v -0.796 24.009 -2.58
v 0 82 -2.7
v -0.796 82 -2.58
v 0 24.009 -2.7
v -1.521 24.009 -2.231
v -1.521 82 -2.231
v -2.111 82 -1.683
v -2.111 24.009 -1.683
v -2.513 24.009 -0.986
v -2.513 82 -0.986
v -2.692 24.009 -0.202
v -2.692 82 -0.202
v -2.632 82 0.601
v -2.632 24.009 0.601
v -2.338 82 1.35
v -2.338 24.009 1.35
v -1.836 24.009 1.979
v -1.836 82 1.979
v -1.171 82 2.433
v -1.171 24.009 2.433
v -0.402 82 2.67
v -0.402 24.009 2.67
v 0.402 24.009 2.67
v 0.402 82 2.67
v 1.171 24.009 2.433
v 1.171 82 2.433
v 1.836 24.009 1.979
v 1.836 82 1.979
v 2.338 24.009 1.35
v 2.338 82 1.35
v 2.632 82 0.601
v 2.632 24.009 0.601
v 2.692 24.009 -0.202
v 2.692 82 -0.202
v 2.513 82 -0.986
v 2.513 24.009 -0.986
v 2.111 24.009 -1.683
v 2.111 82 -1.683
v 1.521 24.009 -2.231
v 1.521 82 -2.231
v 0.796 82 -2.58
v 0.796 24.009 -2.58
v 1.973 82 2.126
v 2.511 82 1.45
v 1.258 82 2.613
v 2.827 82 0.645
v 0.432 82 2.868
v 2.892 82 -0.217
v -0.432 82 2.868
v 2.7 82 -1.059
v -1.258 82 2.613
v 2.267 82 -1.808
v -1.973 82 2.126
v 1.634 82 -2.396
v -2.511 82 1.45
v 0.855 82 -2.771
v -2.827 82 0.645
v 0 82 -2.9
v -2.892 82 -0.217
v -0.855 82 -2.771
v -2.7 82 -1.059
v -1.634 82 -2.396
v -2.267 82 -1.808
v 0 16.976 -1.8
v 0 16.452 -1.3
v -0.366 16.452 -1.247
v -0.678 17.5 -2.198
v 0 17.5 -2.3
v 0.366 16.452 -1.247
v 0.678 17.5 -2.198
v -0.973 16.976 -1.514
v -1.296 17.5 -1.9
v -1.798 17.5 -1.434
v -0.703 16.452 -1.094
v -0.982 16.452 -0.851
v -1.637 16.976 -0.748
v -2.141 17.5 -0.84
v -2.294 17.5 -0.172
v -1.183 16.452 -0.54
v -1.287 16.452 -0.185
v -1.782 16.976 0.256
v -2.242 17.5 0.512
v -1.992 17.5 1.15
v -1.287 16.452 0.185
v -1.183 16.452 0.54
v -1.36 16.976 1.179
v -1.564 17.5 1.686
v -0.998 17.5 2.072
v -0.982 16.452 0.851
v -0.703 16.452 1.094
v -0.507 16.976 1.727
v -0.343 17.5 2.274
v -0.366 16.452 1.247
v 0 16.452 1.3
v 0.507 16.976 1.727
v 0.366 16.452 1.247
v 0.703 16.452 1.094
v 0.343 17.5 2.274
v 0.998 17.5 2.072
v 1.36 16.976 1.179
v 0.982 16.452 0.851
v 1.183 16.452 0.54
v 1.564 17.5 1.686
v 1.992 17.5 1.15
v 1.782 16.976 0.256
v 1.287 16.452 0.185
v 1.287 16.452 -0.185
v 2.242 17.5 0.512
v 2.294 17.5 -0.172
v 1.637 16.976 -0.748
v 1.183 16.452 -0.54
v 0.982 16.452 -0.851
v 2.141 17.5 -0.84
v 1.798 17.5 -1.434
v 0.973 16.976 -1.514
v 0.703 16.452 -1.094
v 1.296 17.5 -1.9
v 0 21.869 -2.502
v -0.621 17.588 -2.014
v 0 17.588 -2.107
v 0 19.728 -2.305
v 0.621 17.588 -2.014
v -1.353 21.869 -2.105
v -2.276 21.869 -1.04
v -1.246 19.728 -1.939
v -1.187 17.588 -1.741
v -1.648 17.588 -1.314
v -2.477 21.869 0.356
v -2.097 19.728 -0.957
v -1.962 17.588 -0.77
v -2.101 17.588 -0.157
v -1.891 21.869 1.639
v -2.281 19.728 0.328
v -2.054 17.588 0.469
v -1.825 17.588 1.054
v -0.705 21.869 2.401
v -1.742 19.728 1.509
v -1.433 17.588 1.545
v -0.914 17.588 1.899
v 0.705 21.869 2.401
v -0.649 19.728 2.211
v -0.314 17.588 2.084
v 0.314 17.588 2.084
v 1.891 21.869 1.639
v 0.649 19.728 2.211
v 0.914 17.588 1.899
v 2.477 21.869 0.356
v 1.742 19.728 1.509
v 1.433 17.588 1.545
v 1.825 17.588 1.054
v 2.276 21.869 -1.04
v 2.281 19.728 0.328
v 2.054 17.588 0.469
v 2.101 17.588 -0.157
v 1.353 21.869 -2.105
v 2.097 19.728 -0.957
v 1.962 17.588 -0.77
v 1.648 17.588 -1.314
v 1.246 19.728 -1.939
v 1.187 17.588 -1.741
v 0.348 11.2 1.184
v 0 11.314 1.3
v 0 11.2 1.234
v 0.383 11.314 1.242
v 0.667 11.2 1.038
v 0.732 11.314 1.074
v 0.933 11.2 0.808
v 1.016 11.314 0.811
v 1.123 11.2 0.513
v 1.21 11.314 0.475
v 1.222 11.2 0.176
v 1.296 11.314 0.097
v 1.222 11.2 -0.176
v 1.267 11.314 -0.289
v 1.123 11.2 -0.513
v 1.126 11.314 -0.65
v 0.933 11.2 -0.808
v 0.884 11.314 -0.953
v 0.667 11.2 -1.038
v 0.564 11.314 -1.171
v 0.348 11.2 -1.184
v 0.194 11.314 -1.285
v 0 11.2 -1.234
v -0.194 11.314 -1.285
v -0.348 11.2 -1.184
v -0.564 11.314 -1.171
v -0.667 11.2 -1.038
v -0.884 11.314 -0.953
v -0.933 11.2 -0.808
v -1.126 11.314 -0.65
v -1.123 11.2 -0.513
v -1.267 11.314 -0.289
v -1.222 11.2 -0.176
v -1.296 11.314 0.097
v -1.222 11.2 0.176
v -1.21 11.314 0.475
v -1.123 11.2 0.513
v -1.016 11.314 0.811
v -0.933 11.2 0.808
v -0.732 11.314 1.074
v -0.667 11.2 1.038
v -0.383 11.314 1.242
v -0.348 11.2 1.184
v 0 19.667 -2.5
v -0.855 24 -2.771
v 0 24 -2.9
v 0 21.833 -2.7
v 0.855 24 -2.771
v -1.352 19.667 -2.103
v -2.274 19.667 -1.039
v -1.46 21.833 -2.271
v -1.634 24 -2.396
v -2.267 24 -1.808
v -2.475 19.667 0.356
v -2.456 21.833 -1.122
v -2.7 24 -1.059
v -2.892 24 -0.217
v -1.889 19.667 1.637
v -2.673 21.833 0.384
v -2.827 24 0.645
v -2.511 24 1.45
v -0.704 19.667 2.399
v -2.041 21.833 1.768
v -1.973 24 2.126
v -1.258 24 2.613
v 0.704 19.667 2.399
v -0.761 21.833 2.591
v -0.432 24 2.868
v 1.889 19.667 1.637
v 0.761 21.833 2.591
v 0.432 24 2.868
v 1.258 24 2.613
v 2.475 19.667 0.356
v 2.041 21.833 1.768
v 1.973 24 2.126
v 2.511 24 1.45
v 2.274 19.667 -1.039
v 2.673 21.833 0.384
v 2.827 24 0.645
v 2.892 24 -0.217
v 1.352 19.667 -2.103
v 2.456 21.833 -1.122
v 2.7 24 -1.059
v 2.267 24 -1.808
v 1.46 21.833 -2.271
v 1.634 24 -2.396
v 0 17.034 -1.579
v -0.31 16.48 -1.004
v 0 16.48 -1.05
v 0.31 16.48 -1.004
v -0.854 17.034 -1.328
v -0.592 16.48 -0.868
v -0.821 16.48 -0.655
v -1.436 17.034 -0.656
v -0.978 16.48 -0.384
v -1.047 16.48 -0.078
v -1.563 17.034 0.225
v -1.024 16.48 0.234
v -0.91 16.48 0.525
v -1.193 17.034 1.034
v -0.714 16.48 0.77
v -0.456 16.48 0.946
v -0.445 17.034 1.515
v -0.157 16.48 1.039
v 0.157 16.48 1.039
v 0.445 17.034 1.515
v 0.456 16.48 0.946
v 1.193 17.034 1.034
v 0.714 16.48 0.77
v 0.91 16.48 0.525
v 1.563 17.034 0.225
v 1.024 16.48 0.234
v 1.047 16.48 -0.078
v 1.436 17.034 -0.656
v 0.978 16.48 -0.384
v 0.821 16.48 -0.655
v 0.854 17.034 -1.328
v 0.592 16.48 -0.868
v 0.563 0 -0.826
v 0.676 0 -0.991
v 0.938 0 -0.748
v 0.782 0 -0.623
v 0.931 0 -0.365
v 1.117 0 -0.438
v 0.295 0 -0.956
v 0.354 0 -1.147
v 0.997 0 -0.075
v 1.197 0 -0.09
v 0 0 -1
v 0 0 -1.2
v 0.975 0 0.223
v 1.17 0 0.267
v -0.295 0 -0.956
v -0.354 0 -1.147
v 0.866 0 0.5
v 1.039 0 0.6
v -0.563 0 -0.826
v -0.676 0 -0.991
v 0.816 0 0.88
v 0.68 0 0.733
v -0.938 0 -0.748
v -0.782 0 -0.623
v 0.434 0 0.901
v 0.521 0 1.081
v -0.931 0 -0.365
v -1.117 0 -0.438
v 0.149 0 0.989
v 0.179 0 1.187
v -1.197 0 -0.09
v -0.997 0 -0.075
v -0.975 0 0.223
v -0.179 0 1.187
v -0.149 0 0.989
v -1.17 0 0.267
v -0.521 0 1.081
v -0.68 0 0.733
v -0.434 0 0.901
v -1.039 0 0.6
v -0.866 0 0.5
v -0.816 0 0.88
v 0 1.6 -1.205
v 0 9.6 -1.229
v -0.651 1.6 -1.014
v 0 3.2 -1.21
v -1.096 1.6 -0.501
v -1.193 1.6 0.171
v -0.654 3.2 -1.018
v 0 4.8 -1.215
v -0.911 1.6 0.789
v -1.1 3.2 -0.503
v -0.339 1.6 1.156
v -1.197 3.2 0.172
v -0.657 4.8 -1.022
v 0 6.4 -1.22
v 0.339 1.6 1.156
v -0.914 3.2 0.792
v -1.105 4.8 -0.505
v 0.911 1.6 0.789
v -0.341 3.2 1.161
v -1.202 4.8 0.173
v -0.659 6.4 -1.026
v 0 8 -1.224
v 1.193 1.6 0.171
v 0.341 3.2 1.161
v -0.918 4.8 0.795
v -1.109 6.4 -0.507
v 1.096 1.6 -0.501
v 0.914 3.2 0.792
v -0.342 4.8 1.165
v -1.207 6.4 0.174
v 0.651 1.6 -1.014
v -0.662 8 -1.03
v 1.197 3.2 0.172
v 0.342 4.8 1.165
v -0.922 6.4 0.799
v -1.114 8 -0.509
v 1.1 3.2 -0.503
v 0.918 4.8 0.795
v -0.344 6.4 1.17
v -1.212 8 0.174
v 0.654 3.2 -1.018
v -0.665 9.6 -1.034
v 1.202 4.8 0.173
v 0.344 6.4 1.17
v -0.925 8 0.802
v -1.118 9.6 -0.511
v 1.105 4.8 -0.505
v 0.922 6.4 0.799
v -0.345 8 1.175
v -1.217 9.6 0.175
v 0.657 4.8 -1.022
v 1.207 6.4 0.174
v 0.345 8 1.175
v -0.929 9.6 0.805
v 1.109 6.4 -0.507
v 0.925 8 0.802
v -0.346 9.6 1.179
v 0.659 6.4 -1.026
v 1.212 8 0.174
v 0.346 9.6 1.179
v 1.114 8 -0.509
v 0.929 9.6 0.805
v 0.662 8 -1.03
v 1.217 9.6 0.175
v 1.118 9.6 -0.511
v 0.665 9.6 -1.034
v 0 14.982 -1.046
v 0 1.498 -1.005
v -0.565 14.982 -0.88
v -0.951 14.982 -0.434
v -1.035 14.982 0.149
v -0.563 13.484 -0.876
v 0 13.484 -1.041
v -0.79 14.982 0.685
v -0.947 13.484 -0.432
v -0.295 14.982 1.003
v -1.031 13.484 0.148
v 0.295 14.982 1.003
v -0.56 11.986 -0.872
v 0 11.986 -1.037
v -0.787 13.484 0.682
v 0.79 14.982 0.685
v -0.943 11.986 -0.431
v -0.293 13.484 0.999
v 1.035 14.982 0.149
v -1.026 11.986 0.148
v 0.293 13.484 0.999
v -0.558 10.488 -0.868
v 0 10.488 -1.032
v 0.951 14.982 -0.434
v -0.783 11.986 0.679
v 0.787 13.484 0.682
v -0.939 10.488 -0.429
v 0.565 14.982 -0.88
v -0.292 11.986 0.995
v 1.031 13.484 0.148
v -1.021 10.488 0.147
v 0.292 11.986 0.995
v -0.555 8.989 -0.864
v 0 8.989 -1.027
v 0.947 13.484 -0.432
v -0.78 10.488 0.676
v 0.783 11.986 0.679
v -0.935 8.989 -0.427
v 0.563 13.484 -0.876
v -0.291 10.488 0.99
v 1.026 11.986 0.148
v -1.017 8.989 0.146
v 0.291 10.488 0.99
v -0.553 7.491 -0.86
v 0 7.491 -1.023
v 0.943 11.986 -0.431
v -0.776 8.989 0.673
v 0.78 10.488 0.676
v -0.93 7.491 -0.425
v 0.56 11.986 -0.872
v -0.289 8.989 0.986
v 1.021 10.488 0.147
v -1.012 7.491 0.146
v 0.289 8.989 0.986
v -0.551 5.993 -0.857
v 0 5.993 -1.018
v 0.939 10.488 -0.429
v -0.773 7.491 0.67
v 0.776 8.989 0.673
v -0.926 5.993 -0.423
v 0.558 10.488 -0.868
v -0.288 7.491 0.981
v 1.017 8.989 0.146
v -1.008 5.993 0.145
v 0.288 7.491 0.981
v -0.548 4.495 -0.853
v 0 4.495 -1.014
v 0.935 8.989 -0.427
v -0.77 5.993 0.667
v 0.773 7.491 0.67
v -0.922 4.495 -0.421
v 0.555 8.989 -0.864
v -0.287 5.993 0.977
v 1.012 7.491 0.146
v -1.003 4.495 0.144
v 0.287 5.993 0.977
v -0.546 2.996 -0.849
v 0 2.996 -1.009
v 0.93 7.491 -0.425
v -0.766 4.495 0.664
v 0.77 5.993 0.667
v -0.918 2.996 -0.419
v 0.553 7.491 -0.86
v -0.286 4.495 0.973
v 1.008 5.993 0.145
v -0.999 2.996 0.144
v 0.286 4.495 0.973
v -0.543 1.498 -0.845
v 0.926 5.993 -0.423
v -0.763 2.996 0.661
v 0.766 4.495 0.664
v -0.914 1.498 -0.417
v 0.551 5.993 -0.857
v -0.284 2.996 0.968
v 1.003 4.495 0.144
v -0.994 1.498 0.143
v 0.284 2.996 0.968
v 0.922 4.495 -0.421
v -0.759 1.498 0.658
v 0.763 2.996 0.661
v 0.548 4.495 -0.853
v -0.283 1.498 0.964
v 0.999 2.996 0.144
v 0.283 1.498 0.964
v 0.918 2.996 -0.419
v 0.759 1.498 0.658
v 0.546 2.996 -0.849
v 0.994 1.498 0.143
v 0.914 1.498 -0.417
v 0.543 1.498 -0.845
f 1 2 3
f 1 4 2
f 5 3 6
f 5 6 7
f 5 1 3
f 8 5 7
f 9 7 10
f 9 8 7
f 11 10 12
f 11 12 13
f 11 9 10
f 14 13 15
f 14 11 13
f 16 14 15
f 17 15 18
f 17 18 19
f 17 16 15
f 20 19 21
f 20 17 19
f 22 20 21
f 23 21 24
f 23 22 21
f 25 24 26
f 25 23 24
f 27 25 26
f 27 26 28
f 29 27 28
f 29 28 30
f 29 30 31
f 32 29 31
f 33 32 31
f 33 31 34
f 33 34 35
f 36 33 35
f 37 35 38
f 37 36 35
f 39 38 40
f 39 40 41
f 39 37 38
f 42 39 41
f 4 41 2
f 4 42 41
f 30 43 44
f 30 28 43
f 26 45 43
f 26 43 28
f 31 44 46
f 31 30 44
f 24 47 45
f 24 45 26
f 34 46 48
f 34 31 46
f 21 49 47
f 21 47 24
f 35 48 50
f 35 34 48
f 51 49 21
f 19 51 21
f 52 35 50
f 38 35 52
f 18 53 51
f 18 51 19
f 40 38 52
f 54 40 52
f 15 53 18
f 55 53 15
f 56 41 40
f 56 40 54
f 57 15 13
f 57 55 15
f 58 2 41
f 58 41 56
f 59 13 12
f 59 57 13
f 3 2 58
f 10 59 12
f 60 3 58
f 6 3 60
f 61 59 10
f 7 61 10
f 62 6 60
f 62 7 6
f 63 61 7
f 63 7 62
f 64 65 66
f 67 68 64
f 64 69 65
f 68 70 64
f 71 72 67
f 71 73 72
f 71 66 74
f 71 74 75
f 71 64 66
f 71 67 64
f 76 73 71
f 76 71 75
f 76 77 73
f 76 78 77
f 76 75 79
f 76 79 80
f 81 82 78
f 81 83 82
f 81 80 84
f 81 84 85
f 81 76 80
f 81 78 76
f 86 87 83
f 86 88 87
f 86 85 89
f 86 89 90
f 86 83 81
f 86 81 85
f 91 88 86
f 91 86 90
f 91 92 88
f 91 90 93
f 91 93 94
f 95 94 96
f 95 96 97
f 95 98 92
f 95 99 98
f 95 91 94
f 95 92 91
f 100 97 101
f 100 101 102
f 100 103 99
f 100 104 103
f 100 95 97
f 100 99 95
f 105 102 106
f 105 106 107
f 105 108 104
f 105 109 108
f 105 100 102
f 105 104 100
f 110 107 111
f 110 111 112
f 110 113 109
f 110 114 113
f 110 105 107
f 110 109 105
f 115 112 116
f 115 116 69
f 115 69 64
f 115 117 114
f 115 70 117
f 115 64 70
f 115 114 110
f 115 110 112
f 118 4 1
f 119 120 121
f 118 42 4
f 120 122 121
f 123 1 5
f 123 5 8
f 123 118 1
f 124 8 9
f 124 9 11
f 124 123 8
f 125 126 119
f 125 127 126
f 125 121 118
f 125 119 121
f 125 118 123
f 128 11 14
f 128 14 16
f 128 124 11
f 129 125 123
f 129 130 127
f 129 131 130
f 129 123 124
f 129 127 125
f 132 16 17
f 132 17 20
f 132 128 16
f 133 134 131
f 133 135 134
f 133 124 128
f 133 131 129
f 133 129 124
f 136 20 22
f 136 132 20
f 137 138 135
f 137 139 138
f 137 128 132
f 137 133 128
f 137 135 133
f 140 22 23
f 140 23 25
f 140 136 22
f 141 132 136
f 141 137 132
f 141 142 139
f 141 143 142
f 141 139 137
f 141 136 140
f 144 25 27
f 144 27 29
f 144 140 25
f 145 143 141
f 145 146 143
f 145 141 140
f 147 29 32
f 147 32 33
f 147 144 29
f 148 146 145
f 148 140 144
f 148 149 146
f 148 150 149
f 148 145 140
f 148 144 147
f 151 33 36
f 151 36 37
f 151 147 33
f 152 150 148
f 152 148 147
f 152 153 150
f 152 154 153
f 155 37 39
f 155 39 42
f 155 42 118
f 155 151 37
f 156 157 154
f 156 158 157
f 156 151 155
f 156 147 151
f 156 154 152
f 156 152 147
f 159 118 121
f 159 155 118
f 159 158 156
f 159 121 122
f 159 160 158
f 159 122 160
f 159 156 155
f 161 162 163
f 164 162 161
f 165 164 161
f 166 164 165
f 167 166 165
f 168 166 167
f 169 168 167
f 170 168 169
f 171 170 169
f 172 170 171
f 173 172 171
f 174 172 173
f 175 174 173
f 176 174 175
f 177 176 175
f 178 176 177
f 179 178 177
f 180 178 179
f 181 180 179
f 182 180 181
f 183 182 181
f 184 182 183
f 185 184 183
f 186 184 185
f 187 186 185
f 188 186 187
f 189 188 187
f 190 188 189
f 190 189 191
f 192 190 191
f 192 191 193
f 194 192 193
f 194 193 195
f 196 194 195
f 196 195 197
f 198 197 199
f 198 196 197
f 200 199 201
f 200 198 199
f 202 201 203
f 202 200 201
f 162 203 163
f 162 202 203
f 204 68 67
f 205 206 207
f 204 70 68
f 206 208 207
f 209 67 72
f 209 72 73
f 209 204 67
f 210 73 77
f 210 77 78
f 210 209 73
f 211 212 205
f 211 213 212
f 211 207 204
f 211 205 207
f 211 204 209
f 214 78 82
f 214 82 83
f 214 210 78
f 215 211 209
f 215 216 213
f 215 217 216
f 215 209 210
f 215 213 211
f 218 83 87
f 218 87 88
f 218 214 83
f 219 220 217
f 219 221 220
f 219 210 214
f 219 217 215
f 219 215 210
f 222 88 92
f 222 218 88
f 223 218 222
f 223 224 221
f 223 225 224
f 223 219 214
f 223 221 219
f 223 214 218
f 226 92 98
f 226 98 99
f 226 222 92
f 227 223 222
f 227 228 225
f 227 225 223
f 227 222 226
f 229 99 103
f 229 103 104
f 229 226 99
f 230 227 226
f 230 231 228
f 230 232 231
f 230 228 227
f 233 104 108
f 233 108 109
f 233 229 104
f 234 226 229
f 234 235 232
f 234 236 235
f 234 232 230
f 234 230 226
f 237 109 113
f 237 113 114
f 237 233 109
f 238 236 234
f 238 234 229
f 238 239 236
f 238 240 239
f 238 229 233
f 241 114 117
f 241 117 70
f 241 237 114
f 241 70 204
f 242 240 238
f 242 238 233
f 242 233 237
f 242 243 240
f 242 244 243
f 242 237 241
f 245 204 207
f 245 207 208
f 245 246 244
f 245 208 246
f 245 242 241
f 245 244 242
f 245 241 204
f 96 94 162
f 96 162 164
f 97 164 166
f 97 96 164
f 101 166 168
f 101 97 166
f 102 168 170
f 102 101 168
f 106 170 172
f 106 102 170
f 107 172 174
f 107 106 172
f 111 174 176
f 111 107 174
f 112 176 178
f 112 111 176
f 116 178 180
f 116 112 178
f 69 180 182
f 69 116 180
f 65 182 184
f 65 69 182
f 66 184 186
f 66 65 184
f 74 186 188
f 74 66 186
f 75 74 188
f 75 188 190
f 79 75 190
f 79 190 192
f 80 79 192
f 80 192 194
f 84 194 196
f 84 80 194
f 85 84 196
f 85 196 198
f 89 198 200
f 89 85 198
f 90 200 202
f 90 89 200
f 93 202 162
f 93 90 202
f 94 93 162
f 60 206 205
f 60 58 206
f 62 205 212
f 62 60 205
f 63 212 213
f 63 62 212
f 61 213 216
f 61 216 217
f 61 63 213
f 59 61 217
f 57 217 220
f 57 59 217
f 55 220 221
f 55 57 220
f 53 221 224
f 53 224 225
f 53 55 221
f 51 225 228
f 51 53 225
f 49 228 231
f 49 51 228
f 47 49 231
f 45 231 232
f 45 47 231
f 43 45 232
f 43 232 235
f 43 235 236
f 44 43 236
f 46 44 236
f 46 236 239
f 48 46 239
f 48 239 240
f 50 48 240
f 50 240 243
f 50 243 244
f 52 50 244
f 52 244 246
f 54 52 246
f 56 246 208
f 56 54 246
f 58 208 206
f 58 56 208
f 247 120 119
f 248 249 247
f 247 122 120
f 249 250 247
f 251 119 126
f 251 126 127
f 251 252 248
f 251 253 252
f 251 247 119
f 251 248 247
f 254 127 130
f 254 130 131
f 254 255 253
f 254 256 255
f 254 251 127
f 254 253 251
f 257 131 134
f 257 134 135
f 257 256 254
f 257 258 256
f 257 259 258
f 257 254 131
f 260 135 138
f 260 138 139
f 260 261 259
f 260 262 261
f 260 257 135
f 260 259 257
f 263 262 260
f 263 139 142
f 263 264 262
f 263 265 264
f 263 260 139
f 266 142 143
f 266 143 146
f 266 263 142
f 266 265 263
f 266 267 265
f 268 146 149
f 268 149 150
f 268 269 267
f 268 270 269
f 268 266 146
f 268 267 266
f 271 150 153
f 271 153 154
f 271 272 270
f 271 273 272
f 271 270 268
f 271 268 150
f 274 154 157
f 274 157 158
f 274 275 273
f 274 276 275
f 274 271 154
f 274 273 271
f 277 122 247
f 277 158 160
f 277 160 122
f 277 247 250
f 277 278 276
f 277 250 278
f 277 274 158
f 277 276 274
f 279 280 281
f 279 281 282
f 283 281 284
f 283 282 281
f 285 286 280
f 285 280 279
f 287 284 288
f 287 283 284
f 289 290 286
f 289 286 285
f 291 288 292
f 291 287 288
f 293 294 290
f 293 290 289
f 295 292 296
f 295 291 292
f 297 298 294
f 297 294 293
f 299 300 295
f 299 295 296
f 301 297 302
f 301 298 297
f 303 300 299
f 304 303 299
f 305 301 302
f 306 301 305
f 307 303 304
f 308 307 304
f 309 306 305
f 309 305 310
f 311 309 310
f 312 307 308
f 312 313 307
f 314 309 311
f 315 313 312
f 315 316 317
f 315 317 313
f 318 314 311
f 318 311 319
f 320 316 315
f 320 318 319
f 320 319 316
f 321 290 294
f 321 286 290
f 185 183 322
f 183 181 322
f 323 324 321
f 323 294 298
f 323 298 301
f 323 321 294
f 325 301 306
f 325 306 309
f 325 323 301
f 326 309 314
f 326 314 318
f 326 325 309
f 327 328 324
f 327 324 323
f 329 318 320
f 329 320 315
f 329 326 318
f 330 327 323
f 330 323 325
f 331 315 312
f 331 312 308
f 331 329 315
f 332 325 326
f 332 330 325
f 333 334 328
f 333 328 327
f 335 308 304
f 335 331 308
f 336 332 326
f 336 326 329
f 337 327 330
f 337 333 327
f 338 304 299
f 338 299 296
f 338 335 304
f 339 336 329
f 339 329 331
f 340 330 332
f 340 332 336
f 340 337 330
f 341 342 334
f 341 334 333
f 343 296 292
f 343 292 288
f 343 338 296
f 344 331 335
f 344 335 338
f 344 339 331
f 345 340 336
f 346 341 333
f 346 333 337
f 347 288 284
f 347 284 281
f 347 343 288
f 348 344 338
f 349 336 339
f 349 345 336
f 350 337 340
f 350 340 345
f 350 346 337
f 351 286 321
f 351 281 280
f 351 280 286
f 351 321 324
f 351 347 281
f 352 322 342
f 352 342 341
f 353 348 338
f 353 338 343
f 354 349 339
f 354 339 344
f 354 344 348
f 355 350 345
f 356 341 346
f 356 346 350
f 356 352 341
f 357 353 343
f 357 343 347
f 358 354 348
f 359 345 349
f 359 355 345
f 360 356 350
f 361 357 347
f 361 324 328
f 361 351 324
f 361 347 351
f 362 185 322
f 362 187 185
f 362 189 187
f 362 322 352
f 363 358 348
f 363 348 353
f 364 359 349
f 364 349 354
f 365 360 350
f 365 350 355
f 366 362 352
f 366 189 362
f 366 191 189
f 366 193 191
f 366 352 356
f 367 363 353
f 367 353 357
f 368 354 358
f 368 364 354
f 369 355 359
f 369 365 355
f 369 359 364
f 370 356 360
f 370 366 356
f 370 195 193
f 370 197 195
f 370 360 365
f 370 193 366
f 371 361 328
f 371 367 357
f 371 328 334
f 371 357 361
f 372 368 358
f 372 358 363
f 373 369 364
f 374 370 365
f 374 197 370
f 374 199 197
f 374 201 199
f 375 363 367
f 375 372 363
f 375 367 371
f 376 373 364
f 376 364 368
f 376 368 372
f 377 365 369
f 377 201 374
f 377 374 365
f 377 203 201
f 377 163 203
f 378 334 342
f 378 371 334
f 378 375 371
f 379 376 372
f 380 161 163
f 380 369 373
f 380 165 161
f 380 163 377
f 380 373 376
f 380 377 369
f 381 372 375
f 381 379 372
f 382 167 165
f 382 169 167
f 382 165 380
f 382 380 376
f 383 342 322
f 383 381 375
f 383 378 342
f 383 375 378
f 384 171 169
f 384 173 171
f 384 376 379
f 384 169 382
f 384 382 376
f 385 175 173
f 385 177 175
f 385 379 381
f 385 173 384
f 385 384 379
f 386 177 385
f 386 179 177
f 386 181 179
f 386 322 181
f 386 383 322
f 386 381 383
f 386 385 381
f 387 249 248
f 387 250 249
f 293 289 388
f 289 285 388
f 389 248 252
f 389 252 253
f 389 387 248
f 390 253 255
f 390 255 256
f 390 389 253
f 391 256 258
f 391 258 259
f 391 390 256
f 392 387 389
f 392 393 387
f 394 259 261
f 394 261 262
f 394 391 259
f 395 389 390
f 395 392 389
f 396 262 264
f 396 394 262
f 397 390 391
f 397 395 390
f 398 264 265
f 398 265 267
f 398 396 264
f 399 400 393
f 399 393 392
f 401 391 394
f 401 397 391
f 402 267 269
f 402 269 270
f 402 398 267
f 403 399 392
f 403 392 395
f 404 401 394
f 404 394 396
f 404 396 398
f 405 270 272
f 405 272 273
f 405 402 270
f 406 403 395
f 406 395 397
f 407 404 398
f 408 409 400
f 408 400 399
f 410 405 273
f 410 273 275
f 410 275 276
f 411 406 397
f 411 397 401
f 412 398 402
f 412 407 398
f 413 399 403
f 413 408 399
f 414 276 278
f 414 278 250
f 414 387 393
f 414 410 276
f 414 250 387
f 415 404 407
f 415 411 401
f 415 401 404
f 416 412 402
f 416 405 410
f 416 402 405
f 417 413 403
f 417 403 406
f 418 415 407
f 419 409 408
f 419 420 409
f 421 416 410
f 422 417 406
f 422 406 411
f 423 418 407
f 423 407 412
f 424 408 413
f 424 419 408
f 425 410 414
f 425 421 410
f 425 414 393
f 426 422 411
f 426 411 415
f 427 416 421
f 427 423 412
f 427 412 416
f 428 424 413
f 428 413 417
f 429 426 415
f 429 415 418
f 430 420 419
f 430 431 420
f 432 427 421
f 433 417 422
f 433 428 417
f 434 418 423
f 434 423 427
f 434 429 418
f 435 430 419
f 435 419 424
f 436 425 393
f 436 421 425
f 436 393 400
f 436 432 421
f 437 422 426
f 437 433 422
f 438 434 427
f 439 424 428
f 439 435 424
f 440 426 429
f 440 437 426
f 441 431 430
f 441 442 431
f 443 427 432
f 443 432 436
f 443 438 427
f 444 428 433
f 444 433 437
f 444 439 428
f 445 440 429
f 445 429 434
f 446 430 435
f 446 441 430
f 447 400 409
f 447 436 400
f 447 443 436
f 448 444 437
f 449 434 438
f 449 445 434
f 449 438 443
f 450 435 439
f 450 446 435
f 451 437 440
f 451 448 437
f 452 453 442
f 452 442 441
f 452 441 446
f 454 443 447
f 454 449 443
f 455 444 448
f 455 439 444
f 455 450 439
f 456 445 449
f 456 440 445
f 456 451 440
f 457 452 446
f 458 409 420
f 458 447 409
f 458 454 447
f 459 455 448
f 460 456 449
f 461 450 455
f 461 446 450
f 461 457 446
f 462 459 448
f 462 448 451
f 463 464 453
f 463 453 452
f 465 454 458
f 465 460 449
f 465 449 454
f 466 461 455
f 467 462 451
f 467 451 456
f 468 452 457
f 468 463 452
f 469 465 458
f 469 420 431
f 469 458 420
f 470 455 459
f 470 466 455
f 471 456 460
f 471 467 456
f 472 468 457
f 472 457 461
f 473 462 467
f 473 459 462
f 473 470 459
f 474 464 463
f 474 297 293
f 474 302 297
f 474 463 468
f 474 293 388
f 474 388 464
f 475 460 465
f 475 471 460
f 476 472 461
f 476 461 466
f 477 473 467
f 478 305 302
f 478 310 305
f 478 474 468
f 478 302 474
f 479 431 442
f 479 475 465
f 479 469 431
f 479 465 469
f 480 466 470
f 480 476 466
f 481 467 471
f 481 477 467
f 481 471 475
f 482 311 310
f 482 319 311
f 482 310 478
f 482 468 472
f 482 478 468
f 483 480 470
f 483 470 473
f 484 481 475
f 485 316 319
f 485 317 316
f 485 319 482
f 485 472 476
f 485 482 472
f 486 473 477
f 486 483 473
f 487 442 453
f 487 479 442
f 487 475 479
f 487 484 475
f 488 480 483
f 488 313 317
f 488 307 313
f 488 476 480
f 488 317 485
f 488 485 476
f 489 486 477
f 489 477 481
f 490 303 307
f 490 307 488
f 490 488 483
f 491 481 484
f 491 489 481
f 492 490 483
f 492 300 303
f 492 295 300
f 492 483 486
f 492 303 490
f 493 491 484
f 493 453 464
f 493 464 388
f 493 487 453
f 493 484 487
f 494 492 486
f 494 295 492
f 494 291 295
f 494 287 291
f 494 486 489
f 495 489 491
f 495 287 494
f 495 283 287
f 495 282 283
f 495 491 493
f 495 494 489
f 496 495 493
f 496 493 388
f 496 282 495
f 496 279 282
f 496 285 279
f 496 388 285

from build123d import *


with BuildPart() as part:
    # Sketch1 → Base-Revolve (revolve)
    with BuildSketch(Plane.XY, mode=Mode.PRIVATE) as base_revolve_sk:
        Polygon((-0.99999907, 0), (-1.2, 0), (-1.25, 16.399999998), (-2.3, 17.5), (-2.9, 24), (-2.9, 82), (-2.7, 82), (-2.7, 24.00921119), (-2.107247336, 17.587723996), (-1.050244154, 16.480387327), align=None)
    revolve(base_revolve_sk.sketch.rotate(Axis((0, 0, 0), (0, 1, 0)), 270), axis=Axis((0, 0, 0), (0, 1, 0)))

    # Esboço1 → Revolução1 (revolve)
    with BuildSketch(Plane.XY, mode=Mode.PRIVATE) as revolu_o1_sk:
        Polygon((-1.234146341, 11.2), (-1.3, 11.314061882), (-1.3, 16.45238095), (-1.25, 16.399999998), align=None)
    revolve(revolu_o1_sk.sketch.rotate(Axis((0, 0, 0), (0, 1, 0)), 90), axis=Axis((0, 0, 0), (0, 1, 0)))


solid = part.part
